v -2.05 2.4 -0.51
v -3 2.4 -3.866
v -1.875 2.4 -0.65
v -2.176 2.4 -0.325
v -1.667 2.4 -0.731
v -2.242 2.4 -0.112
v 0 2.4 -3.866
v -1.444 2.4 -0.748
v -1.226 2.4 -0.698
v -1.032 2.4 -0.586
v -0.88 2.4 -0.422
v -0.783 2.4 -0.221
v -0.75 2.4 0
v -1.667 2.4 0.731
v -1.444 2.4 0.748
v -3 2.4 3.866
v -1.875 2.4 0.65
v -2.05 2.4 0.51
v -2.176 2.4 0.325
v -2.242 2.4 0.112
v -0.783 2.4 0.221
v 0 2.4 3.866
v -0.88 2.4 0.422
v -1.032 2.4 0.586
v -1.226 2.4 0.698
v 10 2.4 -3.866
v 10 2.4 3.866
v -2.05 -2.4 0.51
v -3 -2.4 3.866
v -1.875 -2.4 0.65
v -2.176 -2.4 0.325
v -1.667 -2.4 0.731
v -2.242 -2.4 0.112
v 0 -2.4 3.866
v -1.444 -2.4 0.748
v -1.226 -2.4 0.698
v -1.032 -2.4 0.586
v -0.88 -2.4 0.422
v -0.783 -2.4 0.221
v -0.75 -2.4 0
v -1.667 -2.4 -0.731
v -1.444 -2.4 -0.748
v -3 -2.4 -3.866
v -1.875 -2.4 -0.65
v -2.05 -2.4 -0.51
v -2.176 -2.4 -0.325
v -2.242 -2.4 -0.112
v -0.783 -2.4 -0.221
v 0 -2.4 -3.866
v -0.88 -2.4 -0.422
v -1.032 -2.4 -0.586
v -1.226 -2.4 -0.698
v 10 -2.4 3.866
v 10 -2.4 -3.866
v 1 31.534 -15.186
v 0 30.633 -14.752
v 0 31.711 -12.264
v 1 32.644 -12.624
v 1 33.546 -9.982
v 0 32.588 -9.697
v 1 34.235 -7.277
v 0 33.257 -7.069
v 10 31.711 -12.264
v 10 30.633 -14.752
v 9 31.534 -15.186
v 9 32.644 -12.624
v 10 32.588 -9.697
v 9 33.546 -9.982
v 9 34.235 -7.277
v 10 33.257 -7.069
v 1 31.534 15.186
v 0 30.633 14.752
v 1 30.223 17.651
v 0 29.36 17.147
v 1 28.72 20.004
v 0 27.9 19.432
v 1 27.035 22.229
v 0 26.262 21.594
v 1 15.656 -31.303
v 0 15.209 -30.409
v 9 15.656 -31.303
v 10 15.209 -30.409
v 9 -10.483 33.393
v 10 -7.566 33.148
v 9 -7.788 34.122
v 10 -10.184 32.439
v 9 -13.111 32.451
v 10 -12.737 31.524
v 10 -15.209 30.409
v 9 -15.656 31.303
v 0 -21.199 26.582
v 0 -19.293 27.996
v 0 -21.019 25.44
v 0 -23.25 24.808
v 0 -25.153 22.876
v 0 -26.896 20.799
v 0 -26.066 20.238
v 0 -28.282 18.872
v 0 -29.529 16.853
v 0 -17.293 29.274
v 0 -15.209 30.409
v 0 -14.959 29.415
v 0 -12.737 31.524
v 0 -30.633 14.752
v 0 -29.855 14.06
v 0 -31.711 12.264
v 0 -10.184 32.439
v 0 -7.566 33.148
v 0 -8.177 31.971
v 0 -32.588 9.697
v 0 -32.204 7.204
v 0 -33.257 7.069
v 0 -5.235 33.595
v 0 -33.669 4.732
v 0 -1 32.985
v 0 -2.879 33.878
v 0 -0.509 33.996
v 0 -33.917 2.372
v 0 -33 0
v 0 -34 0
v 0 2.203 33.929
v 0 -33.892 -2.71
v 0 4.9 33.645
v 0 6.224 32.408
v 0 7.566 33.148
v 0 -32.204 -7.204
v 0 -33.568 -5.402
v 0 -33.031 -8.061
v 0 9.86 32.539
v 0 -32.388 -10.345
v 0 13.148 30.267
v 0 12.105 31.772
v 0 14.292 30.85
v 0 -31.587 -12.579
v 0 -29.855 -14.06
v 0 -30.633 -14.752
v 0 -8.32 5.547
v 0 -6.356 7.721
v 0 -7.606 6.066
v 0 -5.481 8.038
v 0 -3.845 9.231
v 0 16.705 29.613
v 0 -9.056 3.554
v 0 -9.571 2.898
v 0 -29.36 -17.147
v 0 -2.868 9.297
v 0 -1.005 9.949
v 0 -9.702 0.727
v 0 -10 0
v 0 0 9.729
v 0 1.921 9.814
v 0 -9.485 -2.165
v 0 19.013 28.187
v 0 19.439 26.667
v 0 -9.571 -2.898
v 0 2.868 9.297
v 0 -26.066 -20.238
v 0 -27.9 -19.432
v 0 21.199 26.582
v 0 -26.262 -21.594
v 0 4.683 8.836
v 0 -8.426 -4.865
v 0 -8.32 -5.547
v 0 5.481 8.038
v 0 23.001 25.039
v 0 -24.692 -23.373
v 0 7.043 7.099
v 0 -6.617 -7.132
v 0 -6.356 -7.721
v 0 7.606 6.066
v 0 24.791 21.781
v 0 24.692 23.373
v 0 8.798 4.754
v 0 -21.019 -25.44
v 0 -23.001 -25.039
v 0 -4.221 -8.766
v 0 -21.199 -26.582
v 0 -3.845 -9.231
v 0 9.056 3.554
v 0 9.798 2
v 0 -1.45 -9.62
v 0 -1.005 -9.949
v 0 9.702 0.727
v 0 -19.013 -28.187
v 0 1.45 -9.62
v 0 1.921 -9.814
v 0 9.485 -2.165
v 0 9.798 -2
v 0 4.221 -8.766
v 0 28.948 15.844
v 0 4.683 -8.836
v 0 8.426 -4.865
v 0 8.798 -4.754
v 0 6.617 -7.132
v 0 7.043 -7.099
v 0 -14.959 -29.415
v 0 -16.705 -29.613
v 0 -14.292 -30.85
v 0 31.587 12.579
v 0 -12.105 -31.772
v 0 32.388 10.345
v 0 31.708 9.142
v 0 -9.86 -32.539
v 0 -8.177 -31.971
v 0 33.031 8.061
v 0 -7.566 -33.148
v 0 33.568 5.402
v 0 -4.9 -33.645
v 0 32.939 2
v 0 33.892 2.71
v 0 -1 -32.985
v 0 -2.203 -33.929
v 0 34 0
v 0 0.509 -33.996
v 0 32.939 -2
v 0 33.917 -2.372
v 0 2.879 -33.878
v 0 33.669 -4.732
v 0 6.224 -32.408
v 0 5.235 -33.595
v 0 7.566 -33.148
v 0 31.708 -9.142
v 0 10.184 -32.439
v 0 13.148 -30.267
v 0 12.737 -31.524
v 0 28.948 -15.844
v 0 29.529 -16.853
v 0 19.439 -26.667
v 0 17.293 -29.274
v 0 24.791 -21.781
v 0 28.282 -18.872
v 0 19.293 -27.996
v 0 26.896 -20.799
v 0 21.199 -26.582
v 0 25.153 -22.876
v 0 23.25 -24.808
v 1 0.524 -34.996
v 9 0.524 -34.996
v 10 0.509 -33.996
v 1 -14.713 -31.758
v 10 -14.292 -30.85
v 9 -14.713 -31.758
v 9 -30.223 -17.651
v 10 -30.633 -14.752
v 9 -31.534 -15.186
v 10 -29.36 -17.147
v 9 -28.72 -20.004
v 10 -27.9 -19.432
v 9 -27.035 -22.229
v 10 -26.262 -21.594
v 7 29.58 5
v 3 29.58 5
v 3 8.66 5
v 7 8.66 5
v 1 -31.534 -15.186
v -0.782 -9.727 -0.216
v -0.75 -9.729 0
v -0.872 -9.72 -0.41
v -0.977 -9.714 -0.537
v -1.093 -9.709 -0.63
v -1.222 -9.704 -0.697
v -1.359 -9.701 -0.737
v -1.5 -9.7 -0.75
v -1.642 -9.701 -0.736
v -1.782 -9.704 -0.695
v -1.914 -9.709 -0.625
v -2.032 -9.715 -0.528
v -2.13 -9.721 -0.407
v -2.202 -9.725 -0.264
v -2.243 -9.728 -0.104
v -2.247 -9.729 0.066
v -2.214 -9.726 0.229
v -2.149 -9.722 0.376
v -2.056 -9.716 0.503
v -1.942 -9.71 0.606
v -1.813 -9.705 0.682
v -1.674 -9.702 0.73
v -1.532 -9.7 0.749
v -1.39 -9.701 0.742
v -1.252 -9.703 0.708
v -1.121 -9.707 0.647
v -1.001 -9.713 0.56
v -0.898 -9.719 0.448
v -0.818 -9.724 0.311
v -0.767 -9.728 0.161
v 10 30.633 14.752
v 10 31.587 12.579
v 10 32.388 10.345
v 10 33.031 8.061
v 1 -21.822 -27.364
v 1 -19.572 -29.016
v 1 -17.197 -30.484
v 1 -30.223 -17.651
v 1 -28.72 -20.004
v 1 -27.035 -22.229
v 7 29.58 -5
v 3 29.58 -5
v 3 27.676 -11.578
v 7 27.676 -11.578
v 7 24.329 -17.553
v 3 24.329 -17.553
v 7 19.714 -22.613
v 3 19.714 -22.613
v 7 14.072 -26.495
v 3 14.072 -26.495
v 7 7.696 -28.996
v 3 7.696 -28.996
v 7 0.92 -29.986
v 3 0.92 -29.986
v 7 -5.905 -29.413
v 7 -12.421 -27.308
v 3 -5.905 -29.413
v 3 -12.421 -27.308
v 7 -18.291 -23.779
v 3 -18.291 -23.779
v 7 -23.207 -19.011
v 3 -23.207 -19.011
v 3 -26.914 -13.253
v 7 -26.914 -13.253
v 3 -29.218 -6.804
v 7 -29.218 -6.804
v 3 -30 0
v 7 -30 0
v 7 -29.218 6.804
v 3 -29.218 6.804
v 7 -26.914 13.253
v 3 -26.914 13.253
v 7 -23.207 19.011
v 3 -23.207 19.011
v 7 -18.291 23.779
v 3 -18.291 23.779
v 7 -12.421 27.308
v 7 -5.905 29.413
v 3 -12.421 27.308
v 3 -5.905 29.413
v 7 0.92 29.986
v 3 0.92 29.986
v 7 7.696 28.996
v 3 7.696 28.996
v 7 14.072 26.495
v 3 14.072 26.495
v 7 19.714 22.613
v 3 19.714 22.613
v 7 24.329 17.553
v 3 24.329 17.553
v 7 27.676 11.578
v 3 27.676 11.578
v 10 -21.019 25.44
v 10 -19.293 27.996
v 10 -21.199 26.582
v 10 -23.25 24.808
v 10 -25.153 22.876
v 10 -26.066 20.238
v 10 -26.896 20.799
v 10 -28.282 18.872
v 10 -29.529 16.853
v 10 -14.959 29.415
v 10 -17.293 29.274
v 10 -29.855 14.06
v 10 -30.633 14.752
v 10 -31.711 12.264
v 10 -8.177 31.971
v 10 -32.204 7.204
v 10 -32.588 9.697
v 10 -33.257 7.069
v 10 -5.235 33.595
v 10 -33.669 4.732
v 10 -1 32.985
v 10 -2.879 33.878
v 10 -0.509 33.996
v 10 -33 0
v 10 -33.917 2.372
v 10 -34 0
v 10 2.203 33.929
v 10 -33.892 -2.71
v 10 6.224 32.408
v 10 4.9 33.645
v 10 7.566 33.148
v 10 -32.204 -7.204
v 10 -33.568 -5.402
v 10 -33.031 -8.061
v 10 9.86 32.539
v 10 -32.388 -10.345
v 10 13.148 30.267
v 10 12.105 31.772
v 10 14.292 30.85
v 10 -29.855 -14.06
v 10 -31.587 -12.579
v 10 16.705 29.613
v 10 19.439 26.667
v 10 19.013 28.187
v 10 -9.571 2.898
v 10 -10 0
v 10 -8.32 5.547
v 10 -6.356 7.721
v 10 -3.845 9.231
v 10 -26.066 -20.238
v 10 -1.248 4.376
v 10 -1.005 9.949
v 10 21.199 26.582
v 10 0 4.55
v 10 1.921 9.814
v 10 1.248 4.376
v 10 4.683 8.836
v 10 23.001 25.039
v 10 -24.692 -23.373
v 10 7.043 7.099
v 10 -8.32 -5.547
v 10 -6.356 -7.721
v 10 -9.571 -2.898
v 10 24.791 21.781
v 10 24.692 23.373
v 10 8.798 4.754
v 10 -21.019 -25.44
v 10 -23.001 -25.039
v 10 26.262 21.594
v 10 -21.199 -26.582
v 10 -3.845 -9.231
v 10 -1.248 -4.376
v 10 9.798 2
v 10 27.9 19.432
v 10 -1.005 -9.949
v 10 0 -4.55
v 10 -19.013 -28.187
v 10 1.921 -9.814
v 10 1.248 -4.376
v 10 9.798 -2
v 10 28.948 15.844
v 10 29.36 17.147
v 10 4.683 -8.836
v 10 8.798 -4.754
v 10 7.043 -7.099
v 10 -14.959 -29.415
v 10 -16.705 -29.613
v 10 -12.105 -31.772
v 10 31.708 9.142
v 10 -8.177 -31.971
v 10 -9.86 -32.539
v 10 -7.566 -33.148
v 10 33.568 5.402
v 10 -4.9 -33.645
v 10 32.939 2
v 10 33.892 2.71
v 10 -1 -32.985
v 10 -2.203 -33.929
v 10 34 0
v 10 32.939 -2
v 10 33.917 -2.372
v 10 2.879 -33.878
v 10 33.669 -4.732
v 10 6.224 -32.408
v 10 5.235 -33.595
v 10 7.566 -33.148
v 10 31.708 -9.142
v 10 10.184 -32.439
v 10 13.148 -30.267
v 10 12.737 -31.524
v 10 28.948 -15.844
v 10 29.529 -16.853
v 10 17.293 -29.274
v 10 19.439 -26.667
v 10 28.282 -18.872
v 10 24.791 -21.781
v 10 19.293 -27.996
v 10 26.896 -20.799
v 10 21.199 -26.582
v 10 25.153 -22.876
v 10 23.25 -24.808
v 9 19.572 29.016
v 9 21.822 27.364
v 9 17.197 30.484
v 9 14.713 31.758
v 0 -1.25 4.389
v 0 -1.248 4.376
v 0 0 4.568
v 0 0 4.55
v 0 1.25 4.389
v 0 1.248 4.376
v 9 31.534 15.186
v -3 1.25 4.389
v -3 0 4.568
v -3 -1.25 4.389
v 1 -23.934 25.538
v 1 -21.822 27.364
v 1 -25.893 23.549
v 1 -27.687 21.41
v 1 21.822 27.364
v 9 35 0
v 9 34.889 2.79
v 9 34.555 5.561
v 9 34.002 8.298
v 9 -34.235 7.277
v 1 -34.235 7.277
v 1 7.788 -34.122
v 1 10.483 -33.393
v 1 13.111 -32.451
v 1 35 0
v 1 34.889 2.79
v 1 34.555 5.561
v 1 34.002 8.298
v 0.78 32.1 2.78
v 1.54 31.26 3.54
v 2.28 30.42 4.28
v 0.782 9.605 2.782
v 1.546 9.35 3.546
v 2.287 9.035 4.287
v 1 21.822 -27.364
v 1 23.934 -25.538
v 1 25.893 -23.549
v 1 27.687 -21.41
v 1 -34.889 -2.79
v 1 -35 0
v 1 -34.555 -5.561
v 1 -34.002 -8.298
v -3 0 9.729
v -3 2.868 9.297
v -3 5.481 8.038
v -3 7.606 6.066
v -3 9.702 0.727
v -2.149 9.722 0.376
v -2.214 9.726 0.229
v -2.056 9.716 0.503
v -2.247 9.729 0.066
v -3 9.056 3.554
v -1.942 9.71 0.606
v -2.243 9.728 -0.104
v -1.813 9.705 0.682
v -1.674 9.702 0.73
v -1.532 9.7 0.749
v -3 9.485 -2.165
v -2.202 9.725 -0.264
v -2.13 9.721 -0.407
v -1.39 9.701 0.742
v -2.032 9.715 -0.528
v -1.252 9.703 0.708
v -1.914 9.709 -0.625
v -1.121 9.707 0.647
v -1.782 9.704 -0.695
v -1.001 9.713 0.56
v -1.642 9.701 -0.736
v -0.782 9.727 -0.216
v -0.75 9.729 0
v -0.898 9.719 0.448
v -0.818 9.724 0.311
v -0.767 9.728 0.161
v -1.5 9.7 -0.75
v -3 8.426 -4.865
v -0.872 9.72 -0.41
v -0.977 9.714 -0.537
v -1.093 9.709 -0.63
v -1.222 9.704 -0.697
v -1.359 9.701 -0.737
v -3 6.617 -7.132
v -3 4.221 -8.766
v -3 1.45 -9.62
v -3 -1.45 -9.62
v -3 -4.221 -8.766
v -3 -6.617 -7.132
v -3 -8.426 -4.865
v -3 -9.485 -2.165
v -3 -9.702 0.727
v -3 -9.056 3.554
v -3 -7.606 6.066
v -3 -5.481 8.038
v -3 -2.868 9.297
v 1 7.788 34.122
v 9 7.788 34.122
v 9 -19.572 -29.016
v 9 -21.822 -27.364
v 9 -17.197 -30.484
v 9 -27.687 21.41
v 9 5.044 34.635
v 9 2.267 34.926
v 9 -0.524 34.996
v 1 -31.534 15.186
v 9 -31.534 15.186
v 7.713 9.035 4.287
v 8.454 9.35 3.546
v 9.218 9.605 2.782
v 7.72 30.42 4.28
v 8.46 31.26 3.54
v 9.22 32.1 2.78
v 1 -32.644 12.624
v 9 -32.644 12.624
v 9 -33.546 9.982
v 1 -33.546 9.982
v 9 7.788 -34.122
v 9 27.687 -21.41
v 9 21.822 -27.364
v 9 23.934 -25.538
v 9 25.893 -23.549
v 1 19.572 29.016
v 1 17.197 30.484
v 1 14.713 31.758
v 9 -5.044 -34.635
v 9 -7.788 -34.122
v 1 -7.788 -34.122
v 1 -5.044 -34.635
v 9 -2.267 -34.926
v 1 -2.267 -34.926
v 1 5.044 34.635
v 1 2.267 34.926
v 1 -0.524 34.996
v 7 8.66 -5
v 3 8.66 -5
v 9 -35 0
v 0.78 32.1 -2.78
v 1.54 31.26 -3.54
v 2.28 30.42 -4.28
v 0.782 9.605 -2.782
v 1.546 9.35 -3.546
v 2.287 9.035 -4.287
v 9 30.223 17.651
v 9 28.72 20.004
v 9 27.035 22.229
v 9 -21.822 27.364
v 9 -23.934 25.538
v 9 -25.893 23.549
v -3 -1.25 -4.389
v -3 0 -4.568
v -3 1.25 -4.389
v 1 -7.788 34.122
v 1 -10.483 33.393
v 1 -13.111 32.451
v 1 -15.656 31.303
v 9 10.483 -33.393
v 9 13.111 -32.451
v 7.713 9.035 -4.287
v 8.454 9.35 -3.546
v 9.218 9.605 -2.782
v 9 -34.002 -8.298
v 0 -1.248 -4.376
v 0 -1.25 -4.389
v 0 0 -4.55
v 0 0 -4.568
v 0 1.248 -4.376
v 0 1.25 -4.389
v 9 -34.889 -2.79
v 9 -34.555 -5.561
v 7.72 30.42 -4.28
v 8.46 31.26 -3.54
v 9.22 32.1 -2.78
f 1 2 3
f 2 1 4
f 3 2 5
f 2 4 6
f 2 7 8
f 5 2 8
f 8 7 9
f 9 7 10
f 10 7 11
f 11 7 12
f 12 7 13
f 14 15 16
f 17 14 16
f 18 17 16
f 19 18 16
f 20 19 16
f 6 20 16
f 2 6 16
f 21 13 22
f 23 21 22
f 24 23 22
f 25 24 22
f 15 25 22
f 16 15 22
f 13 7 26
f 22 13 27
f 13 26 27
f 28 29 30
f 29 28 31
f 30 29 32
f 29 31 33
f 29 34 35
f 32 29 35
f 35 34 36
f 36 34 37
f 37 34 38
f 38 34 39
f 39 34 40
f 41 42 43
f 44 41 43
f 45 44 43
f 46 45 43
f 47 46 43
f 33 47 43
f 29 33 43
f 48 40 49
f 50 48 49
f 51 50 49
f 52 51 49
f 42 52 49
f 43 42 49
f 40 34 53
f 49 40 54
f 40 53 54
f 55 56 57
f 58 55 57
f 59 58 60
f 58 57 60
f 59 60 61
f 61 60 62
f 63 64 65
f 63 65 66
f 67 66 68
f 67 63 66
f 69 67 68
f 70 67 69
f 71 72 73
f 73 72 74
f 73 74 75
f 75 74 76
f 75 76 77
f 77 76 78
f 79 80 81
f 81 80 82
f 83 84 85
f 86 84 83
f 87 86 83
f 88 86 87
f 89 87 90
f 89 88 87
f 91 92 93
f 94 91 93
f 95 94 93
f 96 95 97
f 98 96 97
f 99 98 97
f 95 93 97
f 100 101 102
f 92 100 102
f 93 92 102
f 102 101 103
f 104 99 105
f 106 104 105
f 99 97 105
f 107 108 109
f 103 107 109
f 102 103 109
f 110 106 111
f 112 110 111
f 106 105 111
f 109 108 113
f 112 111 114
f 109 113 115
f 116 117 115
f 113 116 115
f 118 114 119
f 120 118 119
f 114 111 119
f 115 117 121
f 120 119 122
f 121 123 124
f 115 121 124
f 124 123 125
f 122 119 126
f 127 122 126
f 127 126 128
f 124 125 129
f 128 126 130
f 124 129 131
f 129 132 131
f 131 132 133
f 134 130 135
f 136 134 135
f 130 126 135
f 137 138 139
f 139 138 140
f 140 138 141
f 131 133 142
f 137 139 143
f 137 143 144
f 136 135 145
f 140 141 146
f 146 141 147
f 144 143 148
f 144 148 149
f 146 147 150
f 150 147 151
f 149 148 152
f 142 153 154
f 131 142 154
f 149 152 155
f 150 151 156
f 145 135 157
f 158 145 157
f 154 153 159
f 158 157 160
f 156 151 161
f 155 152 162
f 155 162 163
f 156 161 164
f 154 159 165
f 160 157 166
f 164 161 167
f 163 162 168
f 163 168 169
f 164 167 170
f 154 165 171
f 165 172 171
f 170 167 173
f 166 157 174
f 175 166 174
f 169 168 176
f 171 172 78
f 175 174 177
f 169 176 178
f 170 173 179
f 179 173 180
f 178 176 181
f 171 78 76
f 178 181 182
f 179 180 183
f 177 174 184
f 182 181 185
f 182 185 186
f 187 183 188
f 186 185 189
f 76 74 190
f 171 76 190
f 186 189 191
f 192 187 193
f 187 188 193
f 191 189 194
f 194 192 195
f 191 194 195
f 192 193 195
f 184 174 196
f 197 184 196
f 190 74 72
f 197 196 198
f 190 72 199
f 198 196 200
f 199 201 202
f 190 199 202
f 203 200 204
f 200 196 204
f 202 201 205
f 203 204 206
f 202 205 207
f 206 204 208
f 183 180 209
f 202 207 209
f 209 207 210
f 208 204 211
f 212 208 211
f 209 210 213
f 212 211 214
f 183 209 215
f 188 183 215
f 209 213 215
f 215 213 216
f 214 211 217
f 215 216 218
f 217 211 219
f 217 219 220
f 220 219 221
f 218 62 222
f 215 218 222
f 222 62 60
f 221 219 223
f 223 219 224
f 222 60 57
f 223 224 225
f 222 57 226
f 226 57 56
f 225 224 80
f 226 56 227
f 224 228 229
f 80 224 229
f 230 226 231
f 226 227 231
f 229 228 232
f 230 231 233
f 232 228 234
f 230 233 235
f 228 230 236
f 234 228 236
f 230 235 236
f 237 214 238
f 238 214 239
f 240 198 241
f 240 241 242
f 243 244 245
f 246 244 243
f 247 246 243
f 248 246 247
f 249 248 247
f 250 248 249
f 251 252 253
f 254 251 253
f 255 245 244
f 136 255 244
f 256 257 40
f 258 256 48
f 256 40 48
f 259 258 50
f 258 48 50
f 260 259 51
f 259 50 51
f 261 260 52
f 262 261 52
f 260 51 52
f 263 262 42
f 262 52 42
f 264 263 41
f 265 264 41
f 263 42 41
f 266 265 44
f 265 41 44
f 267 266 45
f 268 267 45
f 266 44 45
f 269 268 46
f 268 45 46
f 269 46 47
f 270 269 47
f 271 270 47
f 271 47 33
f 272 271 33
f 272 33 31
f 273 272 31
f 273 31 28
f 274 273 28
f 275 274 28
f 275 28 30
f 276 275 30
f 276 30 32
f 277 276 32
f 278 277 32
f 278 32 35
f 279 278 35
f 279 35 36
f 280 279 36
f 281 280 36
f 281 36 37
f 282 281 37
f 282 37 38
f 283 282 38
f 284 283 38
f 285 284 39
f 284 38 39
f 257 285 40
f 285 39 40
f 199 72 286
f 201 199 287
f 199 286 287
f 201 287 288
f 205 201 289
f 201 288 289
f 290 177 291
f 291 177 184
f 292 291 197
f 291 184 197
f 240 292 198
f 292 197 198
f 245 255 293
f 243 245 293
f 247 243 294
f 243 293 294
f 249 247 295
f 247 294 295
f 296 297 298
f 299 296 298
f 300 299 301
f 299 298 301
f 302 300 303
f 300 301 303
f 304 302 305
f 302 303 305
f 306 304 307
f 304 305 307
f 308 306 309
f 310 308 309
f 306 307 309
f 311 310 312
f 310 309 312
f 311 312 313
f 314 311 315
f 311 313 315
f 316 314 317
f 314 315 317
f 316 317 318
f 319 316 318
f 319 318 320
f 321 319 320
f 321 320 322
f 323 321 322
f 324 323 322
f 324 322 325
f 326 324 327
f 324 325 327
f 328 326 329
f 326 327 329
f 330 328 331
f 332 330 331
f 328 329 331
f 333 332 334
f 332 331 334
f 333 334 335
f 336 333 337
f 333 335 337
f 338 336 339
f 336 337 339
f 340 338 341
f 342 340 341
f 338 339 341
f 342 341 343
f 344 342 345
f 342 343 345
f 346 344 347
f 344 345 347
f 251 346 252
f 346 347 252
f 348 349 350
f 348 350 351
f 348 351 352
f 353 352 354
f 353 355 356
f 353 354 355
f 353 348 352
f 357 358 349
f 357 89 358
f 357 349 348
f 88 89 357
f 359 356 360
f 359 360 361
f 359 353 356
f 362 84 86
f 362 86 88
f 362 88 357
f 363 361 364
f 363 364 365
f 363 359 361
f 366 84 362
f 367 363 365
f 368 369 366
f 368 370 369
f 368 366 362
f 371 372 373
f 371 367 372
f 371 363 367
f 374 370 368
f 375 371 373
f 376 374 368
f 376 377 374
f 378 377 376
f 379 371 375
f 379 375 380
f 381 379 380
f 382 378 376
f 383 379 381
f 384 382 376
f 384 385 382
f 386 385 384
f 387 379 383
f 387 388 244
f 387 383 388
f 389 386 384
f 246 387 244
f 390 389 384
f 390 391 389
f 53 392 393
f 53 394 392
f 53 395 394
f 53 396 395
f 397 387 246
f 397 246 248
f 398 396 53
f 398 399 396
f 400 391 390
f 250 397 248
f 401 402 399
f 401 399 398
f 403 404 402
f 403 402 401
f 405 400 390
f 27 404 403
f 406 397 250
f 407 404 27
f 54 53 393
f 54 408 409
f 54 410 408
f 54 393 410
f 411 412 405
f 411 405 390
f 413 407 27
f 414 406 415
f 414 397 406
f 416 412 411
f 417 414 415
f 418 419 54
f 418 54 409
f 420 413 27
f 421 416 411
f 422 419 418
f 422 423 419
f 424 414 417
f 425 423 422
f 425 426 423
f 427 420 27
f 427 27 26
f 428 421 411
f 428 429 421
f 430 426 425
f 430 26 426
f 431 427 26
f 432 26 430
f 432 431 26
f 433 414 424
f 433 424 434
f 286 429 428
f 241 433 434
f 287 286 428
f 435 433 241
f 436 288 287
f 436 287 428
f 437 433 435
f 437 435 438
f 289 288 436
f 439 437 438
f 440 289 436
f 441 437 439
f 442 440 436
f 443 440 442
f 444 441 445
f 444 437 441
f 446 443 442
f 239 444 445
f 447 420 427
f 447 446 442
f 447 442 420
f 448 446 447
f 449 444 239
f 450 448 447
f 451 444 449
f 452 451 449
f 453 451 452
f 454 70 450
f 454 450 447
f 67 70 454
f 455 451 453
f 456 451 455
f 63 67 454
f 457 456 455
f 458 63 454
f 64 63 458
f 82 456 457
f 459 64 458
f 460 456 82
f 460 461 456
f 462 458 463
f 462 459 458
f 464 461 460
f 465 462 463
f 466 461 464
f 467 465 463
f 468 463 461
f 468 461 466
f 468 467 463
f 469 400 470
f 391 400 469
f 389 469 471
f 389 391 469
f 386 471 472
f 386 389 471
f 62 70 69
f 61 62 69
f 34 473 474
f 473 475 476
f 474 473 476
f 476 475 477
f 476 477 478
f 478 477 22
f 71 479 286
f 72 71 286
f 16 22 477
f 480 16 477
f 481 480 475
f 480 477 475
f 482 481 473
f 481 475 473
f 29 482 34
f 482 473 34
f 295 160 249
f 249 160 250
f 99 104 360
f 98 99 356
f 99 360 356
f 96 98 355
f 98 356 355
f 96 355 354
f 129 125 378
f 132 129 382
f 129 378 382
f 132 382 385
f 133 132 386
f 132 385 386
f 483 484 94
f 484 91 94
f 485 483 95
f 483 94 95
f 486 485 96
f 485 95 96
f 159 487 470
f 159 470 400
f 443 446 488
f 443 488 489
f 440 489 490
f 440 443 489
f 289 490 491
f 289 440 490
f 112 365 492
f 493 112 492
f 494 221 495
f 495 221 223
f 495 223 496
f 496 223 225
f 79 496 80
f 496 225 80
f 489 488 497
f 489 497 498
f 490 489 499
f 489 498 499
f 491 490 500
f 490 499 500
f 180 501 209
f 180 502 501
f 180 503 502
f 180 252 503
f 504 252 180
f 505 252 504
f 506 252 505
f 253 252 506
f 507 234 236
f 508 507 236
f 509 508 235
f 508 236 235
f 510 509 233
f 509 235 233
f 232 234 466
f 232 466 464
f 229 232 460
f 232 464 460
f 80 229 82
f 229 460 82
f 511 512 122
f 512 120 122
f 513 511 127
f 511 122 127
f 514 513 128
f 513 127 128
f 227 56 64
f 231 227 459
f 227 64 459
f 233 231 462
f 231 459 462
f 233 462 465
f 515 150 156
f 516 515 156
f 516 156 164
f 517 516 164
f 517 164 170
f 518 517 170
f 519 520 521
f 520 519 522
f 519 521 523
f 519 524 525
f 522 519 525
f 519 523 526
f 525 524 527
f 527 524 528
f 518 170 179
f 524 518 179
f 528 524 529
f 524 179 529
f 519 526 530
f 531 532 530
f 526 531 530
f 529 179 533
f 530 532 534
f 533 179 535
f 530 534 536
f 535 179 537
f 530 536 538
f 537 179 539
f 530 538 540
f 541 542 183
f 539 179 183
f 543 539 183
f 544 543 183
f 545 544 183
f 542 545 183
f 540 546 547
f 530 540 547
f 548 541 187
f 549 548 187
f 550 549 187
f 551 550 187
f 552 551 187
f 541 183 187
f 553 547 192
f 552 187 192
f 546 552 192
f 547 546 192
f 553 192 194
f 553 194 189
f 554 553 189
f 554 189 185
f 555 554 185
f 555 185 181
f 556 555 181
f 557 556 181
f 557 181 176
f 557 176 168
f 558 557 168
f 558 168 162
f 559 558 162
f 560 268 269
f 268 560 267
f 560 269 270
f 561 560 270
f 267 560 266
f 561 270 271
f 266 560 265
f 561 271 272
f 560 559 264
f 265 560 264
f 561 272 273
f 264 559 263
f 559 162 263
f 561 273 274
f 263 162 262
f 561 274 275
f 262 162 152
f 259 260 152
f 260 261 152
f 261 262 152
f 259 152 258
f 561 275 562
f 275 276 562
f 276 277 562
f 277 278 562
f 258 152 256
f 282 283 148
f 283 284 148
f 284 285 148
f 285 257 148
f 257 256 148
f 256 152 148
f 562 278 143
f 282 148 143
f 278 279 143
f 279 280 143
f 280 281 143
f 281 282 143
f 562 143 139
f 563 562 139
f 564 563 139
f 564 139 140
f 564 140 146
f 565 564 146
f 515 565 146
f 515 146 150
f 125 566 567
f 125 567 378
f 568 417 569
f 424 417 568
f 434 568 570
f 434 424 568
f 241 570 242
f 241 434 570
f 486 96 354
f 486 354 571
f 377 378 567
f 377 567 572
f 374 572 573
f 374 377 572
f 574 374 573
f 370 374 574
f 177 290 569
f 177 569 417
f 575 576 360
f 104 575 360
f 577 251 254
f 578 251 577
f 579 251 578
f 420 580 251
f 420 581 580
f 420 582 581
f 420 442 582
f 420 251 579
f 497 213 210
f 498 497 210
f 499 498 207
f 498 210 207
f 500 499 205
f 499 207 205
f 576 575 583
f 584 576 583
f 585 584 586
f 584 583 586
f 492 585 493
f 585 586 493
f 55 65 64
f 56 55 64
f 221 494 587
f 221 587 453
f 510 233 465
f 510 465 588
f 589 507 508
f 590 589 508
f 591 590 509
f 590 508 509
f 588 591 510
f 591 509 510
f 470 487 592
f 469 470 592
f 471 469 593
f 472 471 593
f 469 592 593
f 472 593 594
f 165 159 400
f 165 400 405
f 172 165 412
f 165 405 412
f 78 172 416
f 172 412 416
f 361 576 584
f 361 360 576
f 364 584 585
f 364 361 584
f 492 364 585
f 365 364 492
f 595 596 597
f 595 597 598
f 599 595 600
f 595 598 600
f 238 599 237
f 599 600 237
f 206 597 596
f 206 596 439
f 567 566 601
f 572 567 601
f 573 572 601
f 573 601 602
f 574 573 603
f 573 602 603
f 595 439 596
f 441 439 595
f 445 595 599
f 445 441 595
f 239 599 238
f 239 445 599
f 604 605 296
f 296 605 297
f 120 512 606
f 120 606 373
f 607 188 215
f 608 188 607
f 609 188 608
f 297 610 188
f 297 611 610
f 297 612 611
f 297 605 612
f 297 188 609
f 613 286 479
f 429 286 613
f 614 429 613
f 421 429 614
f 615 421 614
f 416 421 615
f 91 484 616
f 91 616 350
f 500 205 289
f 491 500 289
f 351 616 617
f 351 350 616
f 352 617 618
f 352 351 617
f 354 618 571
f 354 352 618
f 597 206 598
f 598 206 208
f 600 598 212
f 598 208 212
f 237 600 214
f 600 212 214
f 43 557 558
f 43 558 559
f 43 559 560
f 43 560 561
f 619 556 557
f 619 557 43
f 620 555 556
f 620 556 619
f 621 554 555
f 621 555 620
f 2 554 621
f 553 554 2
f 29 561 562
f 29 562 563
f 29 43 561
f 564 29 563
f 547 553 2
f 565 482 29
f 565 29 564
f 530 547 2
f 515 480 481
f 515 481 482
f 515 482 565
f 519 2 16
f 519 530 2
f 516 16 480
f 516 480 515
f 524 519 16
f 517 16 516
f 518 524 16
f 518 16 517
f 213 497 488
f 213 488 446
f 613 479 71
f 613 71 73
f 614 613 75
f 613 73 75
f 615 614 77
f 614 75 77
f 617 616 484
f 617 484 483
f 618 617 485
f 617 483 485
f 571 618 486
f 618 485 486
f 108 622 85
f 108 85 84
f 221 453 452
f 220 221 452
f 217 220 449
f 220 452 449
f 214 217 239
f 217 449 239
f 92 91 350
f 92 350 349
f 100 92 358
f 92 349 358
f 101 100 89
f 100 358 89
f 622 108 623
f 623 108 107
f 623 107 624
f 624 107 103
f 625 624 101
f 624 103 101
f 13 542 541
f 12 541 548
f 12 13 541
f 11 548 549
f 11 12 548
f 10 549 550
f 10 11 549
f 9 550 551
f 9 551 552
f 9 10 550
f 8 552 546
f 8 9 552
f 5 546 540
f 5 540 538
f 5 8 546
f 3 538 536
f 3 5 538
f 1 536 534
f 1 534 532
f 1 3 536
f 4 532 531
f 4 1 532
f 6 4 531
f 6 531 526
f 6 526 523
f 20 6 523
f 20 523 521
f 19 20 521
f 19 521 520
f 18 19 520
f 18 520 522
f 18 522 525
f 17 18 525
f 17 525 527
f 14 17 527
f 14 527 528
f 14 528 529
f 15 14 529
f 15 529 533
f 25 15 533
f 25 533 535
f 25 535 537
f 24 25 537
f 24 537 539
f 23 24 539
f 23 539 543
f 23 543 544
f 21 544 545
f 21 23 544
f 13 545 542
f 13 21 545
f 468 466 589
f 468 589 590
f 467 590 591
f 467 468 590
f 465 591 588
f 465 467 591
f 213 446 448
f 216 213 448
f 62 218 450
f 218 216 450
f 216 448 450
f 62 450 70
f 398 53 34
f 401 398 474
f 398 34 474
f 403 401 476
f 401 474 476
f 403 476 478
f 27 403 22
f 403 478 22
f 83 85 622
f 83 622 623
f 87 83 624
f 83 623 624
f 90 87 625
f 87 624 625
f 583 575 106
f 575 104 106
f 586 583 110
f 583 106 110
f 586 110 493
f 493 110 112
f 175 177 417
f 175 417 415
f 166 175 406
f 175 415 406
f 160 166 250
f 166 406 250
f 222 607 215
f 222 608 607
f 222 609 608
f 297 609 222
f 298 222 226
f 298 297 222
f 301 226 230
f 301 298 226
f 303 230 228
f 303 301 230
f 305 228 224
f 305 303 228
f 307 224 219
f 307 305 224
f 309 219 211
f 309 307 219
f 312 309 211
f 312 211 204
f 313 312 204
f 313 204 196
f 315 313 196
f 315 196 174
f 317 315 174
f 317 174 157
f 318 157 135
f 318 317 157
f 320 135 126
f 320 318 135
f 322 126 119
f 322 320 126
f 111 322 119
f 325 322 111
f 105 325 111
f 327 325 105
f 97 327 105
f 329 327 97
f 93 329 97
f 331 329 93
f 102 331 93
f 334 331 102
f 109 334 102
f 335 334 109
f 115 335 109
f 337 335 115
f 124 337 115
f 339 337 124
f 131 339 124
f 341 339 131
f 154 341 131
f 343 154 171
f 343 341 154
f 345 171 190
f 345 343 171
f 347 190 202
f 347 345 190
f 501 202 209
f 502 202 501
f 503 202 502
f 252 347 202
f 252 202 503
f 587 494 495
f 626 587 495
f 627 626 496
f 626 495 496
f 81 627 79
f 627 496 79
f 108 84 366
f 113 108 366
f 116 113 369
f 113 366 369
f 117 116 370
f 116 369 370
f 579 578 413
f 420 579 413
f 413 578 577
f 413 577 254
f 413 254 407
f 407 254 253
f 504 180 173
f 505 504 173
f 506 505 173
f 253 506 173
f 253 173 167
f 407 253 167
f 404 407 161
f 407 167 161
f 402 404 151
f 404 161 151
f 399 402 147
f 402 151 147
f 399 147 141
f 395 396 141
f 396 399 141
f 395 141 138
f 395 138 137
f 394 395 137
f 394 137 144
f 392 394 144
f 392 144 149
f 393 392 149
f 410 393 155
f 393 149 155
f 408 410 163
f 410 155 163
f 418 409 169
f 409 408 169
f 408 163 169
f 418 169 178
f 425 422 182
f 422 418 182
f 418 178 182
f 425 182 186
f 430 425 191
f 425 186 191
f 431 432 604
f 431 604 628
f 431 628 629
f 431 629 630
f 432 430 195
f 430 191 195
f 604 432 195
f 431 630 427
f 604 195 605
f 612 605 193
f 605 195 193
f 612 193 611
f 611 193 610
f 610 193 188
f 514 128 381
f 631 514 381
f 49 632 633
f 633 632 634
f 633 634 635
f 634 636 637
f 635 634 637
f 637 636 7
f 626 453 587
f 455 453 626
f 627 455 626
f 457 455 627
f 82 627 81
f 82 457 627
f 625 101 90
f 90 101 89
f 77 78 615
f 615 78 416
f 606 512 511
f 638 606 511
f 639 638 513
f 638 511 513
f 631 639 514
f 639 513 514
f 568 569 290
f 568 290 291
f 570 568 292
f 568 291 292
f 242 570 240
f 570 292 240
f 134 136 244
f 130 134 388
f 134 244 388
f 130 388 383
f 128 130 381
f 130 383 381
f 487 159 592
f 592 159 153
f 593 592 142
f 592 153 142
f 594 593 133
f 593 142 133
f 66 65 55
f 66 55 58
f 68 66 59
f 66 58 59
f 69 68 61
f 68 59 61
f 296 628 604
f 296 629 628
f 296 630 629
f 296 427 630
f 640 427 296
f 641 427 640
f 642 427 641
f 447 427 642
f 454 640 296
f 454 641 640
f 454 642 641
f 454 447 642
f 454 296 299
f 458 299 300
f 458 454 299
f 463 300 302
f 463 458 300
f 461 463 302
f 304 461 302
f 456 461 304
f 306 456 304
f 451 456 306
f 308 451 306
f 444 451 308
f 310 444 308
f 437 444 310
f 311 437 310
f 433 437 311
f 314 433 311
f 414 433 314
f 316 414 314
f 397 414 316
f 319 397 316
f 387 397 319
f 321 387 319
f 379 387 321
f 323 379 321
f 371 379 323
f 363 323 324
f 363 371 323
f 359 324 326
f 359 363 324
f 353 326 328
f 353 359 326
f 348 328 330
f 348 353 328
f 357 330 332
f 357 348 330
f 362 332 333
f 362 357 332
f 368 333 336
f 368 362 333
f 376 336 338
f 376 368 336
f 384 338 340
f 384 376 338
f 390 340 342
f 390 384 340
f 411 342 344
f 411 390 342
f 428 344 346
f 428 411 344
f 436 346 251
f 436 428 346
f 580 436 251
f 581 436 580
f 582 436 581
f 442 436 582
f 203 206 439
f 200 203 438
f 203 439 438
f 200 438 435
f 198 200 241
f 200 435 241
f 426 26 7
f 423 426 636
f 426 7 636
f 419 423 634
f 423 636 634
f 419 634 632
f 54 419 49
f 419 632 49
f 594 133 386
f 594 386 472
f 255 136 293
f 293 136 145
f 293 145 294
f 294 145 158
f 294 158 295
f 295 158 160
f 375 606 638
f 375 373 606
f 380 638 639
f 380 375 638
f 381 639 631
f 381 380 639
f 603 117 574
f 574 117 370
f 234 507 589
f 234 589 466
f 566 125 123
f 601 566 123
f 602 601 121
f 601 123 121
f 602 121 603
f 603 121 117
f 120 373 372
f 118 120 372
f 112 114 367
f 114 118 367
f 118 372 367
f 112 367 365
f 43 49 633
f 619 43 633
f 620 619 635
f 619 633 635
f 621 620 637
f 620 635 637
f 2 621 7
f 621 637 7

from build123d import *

# Parameters (mm, degrees)
SKETCH1_R               = 35
BOSS_EXTRUDE1_DEPTH     = 10
CHAMFER1_SIZE           = 1
CUT_EXTRUDE1_DEPTH      = 11
SKETCH3_R               = 1.5
CUT_EXTRUDE2_DEPTH      = 11
CUT_EXTRUDE3_DEPTH      = 10
SKETCH5_R               = 9.729015648
BOSS_EXTRUDE2_DEPTH     = 3
SKETCH6_R               = 0.75
CUT_EXTRUDE4_DEPTH      = 36
CUT_EXTRUDE4_DEPTH_BACK = 36
CHAMFER2_SIZE           = 3


with BuildPart() as part:
    # Sketch1 → Boss-Extrude1 (new body)
    with BuildSketch(Plane(origin=(0, 0, 0), x_dir=(0, 0, -1), z_dir=(1, 0, 0))):
        Circle(SKETCH1_R)
        with BuildLine():
            Line((-5, 29.580398915), (-5, 8.660254038))
            ThreePointArc((-5, 8.660254038), (0, -10), (5, 8.660254038))
            Line((5, 8.660254038), (5, 29.580398915))
            ThreePointArc((5, 29.580398915), (0, -30), (-5, 29.580398915))
        make_face(mode=Mode.SUBTRACT)
    extrude(amount=BOSS_EXTRUDE1_DEPTH)

    # Chamfer1
    chamfer1_edges = [part.edges().sort_by_distance(p)[0] for p in [
        (0, 0, 35),
        (10, 0, 35),
    ]]
    chamfer(chamfer1_edges, length=CHAMFER1_SIZE)

    # Sketch2 → Cut-Extrude1 (cut, through all)
    with BuildSketch(Plane(origin=(10, 0, 0), x_dir=(0, 0, -1), z_dir=(1, 0, 0))):
        with BuildLine():
            Line((0, 35), (0, 34))
            ThreePointArc((0, 34), (3.553967751, 33.813744443), (7.068997488, 33.257018425))
            Line((7.068997488, 33.257018425), (7.276909179, 34.235166026))
            ThreePointArc((7.276909179, 34.235166026), (3.658496214, 34.808266338), (0, 35))
        make_face()
        with BuildLine():
            Line((15.185930869, 31.533910377), (14.75204713, 30.632941509))
            ThreePointArc((14.75204713, 30.632941509), (17.873248174, 28.923122233), (20.79862617, 26.896415178))
            Line((20.79862617, 26.896415178), (21.410350469, 27.687486213))
            ThreePointArc((21.410350469, 27.687486213), (18.398931943, 29.773802299), (15.185930869, 31.533910377))
        make_face()
        with BuildLine():
            Line((27.364101886, 21.822143065), (26.582270404, 21.198653263))
            ThreePointArc((26.582270404, 21.198653263), (28.652512594, 18.303920947), (30.408831861, 15.208647043))
            Line((30.408831861, 15.208647043), (31.303209268, 15.655960191))
            ThreePointArc((31.303209268, 15.655960191), (29.495233553, 18.842271563), (27.364101886, 21.822143065))
        make_face()
        with BuildLine():
            Line((34.122476926, 7.788232688), (33.147549014, 7.565711755))
            ThreePointArc((33.147549014, 7.565711755), (33.756795496, 4.059403634), (33.996195462, 0.508619839))
            Line((33.996195462, 0.508619839), (34.996083563, 0.523579246))
            ThreePointArc((34.996083563, 0.523579246), (34.749642422, 4.178797859), (34.122476926, 7.788232688))
        make_face()
        with BuildLine():
            Line((34.122476926, -7.788232688), (33.147549014, -7.565711755))
            ThreePointArc((33.147549014, -7.565711755), (32.175131049, -10.989128353), (30.850195615, -14.292145763))
            Line((30.850195615, -14.292145763), (31.75755431, -14.712502991))
            ThreePointArc((31.75755431, -14.712502991), (33.121458433, -11.312338011), (34.122476926, -7.788232688))
        make_face()
        with BuildLine():
            Line((27.364101886, -21.822143065), (26.582270404, -21.198653263))
            ThreePointArc((26.582270404, -21.198653263), (24.220787296, -23.861128698), (21.593936175, -26.262176614))
            Line((21.593936175, -26.262176614), (22.229051944, -27.034593573))
            ThreePointArc((22.229051944, -27.034593573), (24.933163393, -24.562926601), (27.364101886, -21.822143065))
        make_face()
        with BuildLine():
            Line((15.185930869, -31.533910377), (14.75204713, -30.632941509))
            ThreePointArc((14.75204713, -30.632941509), (11.469219571, -32.007139866), (8.060732842, -33.030661302))
            Line((8.060732842, -33.030661302), (8.29781322, -34.00215134))
            ThreePointArc((8.29781322, -34.00215134), (11.806549558, -32.948526333), (15.185930869, -31.533910377))
        make_face()
        with BuildLine():
            Line((0, -35), (0, -34))
            ThreePointArc((0, -34), (-3.553967751, -33.813744443), (-7.068997488, -33.257018425))
            Line((-7.068997488, -33.257018425), (-7.276909179, -34.235166026))
            ThreePointArc((-7.276909179, -34.235166026), (-3.658496214, -34.808266338), (0, -35))
        make_face()
        with BuildLine():
            Line((-15.185930869, -31.533910377), (-14.75204713, -30.632941509))
            ThreePointArc((-14.75204713, -30.632941509), (-17.873248174, -28.923122233), (-20.79862617, -26.896415178))
            Line((-20.79862617, -26.896415178), (-21.410350469, -27.687486213))
            ThreePointArc((-21.410350469, -27.687486213), (-18.398931943, -29.773802299), (-15.185930869, -31.533910377))
        make_face()
        with BuildLine():
            Line((-27.364101886, -21.822143065), (-26.582270404, -21.198653263))
            ThreePointArc((-26.582270404, -21.198653263), (-28.652512594, -18.303920947), (-30.408831861, -15.208647043))
            Line((-30.408831861, -15.208647043), (-31.303209268, -15.655960191))
            ThreePointArc((-31.303209268, -15.655960191), (-29.495233553, -18.842271563), (-27.364101886, -21.822143065))
        make_face()
        with BuildLine():
            Line((-34.122476926, -7.788232688), (-33.147549014, -7.565711755))
            ThreePointArc((-33.147549014, -7.565711755), (-33.756795496, -4.059403634), (-33.996195462, -0.508619839))
            Line((-33.996195462, -0.508619839), (-34.996083563, -0.523579246))
            ThreePointArc((-34.996083563, -0.523579246), (-34.749642422, -4.178797859), (-34.122476926, -7.788232688))
        make_face()
        with BuildLine():
            Line((-34.122476926, 7.788232688), (-33.147549014, 7.565711755))
            ThreePointArc((-33.147549014, 7.565711755), (-32.175131049, 10.989128353), (-30.850195615, 14.292145763))
            Line((-30.850195615, 14.292145763), (-31.75755431, 14.712502991))
            ThreePointArc((-31.75755431, 14.712502991), (-33.121458433, 11.312338011), (-34.122476926, 7.788232688))
        make_face()
        with BuildLine():
            Line((-27.364101886, 21.822143065), (-26.582270404, 21.198653263))
            ThreePointArc((-26.582270404, 21.198653263), (-24.220787296, 23.861128698), (-21.593936175, 26.262176614))
            Line((-21.593936175, 26.262176614), (-22.229051944, 27.034593573))
            ThreePointArc((-22.229051944, 27.034593573), (-24.933163393, 24.562926601), (-27.364101886, 21.822143065))
        make_face()
        with BuildLine():
            Line((-15.185930869, 31.533910377), (-14.75204713, 30.632941509))
            ThreePointArc((-14.75204713, 30.632941509), (-11.469219571, 32.007139866), (-8.060732842, 33.030661302))
            Line((-8.060732842, 33.030661302), (-8.29781322, 34.00215134))
            ThreePointArc((-8.29781322, 34.00215134), (-11.806549558, 32.948526333), (-15.185930869, 31.533910377))
        make_face()
    extrude(amount=-CUT_EXTRUDE1_DEPTH, mode=Mode.SUBTRACT)

    # Sketch3 → Cut-Extrude2 (cut, through all)
    with BuildSketch(Plane.ZY):
        Circle(SKETCH3_R)
    extrude(amount=-CUT_EXTRUDE2_DEPTH, mode=Mode.SUBTRACT)

    # Sketch4 → Cut-Extrude3 (cut)
    with BuildSketch(Plane.ZY):
        with BuildLine():
            Line((-3.865553001, -2.4), (3.865553001, -2.4))
            ThreePointArc((3.865553001, -2.4), (4.55, 0), (3.865553001, 2.4))
            Line((3.865553001, 2.4), (-3.865553001, 2.4))
            ThreePointArc((-3.865553001, 2.4), (-4.55, 0), (-3.865553001, -2.4))
        make_face()
    extrude(amount=-CUT_EXTRUDE3_DEPTH, mode=Mode.SUBTRACT)

    # Sketch5 → Boss-Extrude2 (add)
    with BuildSketch(Plane.ZY):
        Circle(SKETCH5_R)
        with BuildLine():
            Line((-3.865553001, 2.4), (3.865553001, 2.4))
            ThreePointArc((3.865553001, 2.4), (4.568220616, 0), (3.865553001, -2.4))
            Line((3.865553001, -2.4), (-3.865553001, -2.4))
            ThreePointArc((-3.865553001, -2.4), (-4.568220616, 0), (-3.865553001, 2.4))
        make_face(mode=Mode.SUBTRACT)
    extrude(amount=BOSS_EXTRUDE2_DEPTH)

    # Sketch6 → Cut-Extrude4 (cut, two sides)
    with BuildSketch(Plane(origin=(0, 0, 0), x_dir=(1, 0, 0), z_dir=(0, 1, 0))) as cut_extrude4_sk:
        with Locations((-1.5, 0)):
            Circle(SKETCH6_R)
    extrude(amount=CUT_EXTRUDE4_DEPTH, mode=Mode.SUBTRACT)
    extrude(cut_extrude4_sk.sketch, amount=-CUT_EXTRUDE4_DEPTH_BACK, mode=Mode.SUBTRACT)

    # Chamfer2
    chamfer2_edges = [part.edges().sort_by_distance(p)[0] for p in [
        (10, 19.120326477, 5),
        (0, -30, 0),
        (0, 19.120326477, -5),
        (0, 19.120326477, 5),
        (10, -30, 0),
        (10, 19.120326477, -5),
    ]]
    chamfer(chamfer2_edges, length=CHAMFER2_SIZE)


solid = part.part
